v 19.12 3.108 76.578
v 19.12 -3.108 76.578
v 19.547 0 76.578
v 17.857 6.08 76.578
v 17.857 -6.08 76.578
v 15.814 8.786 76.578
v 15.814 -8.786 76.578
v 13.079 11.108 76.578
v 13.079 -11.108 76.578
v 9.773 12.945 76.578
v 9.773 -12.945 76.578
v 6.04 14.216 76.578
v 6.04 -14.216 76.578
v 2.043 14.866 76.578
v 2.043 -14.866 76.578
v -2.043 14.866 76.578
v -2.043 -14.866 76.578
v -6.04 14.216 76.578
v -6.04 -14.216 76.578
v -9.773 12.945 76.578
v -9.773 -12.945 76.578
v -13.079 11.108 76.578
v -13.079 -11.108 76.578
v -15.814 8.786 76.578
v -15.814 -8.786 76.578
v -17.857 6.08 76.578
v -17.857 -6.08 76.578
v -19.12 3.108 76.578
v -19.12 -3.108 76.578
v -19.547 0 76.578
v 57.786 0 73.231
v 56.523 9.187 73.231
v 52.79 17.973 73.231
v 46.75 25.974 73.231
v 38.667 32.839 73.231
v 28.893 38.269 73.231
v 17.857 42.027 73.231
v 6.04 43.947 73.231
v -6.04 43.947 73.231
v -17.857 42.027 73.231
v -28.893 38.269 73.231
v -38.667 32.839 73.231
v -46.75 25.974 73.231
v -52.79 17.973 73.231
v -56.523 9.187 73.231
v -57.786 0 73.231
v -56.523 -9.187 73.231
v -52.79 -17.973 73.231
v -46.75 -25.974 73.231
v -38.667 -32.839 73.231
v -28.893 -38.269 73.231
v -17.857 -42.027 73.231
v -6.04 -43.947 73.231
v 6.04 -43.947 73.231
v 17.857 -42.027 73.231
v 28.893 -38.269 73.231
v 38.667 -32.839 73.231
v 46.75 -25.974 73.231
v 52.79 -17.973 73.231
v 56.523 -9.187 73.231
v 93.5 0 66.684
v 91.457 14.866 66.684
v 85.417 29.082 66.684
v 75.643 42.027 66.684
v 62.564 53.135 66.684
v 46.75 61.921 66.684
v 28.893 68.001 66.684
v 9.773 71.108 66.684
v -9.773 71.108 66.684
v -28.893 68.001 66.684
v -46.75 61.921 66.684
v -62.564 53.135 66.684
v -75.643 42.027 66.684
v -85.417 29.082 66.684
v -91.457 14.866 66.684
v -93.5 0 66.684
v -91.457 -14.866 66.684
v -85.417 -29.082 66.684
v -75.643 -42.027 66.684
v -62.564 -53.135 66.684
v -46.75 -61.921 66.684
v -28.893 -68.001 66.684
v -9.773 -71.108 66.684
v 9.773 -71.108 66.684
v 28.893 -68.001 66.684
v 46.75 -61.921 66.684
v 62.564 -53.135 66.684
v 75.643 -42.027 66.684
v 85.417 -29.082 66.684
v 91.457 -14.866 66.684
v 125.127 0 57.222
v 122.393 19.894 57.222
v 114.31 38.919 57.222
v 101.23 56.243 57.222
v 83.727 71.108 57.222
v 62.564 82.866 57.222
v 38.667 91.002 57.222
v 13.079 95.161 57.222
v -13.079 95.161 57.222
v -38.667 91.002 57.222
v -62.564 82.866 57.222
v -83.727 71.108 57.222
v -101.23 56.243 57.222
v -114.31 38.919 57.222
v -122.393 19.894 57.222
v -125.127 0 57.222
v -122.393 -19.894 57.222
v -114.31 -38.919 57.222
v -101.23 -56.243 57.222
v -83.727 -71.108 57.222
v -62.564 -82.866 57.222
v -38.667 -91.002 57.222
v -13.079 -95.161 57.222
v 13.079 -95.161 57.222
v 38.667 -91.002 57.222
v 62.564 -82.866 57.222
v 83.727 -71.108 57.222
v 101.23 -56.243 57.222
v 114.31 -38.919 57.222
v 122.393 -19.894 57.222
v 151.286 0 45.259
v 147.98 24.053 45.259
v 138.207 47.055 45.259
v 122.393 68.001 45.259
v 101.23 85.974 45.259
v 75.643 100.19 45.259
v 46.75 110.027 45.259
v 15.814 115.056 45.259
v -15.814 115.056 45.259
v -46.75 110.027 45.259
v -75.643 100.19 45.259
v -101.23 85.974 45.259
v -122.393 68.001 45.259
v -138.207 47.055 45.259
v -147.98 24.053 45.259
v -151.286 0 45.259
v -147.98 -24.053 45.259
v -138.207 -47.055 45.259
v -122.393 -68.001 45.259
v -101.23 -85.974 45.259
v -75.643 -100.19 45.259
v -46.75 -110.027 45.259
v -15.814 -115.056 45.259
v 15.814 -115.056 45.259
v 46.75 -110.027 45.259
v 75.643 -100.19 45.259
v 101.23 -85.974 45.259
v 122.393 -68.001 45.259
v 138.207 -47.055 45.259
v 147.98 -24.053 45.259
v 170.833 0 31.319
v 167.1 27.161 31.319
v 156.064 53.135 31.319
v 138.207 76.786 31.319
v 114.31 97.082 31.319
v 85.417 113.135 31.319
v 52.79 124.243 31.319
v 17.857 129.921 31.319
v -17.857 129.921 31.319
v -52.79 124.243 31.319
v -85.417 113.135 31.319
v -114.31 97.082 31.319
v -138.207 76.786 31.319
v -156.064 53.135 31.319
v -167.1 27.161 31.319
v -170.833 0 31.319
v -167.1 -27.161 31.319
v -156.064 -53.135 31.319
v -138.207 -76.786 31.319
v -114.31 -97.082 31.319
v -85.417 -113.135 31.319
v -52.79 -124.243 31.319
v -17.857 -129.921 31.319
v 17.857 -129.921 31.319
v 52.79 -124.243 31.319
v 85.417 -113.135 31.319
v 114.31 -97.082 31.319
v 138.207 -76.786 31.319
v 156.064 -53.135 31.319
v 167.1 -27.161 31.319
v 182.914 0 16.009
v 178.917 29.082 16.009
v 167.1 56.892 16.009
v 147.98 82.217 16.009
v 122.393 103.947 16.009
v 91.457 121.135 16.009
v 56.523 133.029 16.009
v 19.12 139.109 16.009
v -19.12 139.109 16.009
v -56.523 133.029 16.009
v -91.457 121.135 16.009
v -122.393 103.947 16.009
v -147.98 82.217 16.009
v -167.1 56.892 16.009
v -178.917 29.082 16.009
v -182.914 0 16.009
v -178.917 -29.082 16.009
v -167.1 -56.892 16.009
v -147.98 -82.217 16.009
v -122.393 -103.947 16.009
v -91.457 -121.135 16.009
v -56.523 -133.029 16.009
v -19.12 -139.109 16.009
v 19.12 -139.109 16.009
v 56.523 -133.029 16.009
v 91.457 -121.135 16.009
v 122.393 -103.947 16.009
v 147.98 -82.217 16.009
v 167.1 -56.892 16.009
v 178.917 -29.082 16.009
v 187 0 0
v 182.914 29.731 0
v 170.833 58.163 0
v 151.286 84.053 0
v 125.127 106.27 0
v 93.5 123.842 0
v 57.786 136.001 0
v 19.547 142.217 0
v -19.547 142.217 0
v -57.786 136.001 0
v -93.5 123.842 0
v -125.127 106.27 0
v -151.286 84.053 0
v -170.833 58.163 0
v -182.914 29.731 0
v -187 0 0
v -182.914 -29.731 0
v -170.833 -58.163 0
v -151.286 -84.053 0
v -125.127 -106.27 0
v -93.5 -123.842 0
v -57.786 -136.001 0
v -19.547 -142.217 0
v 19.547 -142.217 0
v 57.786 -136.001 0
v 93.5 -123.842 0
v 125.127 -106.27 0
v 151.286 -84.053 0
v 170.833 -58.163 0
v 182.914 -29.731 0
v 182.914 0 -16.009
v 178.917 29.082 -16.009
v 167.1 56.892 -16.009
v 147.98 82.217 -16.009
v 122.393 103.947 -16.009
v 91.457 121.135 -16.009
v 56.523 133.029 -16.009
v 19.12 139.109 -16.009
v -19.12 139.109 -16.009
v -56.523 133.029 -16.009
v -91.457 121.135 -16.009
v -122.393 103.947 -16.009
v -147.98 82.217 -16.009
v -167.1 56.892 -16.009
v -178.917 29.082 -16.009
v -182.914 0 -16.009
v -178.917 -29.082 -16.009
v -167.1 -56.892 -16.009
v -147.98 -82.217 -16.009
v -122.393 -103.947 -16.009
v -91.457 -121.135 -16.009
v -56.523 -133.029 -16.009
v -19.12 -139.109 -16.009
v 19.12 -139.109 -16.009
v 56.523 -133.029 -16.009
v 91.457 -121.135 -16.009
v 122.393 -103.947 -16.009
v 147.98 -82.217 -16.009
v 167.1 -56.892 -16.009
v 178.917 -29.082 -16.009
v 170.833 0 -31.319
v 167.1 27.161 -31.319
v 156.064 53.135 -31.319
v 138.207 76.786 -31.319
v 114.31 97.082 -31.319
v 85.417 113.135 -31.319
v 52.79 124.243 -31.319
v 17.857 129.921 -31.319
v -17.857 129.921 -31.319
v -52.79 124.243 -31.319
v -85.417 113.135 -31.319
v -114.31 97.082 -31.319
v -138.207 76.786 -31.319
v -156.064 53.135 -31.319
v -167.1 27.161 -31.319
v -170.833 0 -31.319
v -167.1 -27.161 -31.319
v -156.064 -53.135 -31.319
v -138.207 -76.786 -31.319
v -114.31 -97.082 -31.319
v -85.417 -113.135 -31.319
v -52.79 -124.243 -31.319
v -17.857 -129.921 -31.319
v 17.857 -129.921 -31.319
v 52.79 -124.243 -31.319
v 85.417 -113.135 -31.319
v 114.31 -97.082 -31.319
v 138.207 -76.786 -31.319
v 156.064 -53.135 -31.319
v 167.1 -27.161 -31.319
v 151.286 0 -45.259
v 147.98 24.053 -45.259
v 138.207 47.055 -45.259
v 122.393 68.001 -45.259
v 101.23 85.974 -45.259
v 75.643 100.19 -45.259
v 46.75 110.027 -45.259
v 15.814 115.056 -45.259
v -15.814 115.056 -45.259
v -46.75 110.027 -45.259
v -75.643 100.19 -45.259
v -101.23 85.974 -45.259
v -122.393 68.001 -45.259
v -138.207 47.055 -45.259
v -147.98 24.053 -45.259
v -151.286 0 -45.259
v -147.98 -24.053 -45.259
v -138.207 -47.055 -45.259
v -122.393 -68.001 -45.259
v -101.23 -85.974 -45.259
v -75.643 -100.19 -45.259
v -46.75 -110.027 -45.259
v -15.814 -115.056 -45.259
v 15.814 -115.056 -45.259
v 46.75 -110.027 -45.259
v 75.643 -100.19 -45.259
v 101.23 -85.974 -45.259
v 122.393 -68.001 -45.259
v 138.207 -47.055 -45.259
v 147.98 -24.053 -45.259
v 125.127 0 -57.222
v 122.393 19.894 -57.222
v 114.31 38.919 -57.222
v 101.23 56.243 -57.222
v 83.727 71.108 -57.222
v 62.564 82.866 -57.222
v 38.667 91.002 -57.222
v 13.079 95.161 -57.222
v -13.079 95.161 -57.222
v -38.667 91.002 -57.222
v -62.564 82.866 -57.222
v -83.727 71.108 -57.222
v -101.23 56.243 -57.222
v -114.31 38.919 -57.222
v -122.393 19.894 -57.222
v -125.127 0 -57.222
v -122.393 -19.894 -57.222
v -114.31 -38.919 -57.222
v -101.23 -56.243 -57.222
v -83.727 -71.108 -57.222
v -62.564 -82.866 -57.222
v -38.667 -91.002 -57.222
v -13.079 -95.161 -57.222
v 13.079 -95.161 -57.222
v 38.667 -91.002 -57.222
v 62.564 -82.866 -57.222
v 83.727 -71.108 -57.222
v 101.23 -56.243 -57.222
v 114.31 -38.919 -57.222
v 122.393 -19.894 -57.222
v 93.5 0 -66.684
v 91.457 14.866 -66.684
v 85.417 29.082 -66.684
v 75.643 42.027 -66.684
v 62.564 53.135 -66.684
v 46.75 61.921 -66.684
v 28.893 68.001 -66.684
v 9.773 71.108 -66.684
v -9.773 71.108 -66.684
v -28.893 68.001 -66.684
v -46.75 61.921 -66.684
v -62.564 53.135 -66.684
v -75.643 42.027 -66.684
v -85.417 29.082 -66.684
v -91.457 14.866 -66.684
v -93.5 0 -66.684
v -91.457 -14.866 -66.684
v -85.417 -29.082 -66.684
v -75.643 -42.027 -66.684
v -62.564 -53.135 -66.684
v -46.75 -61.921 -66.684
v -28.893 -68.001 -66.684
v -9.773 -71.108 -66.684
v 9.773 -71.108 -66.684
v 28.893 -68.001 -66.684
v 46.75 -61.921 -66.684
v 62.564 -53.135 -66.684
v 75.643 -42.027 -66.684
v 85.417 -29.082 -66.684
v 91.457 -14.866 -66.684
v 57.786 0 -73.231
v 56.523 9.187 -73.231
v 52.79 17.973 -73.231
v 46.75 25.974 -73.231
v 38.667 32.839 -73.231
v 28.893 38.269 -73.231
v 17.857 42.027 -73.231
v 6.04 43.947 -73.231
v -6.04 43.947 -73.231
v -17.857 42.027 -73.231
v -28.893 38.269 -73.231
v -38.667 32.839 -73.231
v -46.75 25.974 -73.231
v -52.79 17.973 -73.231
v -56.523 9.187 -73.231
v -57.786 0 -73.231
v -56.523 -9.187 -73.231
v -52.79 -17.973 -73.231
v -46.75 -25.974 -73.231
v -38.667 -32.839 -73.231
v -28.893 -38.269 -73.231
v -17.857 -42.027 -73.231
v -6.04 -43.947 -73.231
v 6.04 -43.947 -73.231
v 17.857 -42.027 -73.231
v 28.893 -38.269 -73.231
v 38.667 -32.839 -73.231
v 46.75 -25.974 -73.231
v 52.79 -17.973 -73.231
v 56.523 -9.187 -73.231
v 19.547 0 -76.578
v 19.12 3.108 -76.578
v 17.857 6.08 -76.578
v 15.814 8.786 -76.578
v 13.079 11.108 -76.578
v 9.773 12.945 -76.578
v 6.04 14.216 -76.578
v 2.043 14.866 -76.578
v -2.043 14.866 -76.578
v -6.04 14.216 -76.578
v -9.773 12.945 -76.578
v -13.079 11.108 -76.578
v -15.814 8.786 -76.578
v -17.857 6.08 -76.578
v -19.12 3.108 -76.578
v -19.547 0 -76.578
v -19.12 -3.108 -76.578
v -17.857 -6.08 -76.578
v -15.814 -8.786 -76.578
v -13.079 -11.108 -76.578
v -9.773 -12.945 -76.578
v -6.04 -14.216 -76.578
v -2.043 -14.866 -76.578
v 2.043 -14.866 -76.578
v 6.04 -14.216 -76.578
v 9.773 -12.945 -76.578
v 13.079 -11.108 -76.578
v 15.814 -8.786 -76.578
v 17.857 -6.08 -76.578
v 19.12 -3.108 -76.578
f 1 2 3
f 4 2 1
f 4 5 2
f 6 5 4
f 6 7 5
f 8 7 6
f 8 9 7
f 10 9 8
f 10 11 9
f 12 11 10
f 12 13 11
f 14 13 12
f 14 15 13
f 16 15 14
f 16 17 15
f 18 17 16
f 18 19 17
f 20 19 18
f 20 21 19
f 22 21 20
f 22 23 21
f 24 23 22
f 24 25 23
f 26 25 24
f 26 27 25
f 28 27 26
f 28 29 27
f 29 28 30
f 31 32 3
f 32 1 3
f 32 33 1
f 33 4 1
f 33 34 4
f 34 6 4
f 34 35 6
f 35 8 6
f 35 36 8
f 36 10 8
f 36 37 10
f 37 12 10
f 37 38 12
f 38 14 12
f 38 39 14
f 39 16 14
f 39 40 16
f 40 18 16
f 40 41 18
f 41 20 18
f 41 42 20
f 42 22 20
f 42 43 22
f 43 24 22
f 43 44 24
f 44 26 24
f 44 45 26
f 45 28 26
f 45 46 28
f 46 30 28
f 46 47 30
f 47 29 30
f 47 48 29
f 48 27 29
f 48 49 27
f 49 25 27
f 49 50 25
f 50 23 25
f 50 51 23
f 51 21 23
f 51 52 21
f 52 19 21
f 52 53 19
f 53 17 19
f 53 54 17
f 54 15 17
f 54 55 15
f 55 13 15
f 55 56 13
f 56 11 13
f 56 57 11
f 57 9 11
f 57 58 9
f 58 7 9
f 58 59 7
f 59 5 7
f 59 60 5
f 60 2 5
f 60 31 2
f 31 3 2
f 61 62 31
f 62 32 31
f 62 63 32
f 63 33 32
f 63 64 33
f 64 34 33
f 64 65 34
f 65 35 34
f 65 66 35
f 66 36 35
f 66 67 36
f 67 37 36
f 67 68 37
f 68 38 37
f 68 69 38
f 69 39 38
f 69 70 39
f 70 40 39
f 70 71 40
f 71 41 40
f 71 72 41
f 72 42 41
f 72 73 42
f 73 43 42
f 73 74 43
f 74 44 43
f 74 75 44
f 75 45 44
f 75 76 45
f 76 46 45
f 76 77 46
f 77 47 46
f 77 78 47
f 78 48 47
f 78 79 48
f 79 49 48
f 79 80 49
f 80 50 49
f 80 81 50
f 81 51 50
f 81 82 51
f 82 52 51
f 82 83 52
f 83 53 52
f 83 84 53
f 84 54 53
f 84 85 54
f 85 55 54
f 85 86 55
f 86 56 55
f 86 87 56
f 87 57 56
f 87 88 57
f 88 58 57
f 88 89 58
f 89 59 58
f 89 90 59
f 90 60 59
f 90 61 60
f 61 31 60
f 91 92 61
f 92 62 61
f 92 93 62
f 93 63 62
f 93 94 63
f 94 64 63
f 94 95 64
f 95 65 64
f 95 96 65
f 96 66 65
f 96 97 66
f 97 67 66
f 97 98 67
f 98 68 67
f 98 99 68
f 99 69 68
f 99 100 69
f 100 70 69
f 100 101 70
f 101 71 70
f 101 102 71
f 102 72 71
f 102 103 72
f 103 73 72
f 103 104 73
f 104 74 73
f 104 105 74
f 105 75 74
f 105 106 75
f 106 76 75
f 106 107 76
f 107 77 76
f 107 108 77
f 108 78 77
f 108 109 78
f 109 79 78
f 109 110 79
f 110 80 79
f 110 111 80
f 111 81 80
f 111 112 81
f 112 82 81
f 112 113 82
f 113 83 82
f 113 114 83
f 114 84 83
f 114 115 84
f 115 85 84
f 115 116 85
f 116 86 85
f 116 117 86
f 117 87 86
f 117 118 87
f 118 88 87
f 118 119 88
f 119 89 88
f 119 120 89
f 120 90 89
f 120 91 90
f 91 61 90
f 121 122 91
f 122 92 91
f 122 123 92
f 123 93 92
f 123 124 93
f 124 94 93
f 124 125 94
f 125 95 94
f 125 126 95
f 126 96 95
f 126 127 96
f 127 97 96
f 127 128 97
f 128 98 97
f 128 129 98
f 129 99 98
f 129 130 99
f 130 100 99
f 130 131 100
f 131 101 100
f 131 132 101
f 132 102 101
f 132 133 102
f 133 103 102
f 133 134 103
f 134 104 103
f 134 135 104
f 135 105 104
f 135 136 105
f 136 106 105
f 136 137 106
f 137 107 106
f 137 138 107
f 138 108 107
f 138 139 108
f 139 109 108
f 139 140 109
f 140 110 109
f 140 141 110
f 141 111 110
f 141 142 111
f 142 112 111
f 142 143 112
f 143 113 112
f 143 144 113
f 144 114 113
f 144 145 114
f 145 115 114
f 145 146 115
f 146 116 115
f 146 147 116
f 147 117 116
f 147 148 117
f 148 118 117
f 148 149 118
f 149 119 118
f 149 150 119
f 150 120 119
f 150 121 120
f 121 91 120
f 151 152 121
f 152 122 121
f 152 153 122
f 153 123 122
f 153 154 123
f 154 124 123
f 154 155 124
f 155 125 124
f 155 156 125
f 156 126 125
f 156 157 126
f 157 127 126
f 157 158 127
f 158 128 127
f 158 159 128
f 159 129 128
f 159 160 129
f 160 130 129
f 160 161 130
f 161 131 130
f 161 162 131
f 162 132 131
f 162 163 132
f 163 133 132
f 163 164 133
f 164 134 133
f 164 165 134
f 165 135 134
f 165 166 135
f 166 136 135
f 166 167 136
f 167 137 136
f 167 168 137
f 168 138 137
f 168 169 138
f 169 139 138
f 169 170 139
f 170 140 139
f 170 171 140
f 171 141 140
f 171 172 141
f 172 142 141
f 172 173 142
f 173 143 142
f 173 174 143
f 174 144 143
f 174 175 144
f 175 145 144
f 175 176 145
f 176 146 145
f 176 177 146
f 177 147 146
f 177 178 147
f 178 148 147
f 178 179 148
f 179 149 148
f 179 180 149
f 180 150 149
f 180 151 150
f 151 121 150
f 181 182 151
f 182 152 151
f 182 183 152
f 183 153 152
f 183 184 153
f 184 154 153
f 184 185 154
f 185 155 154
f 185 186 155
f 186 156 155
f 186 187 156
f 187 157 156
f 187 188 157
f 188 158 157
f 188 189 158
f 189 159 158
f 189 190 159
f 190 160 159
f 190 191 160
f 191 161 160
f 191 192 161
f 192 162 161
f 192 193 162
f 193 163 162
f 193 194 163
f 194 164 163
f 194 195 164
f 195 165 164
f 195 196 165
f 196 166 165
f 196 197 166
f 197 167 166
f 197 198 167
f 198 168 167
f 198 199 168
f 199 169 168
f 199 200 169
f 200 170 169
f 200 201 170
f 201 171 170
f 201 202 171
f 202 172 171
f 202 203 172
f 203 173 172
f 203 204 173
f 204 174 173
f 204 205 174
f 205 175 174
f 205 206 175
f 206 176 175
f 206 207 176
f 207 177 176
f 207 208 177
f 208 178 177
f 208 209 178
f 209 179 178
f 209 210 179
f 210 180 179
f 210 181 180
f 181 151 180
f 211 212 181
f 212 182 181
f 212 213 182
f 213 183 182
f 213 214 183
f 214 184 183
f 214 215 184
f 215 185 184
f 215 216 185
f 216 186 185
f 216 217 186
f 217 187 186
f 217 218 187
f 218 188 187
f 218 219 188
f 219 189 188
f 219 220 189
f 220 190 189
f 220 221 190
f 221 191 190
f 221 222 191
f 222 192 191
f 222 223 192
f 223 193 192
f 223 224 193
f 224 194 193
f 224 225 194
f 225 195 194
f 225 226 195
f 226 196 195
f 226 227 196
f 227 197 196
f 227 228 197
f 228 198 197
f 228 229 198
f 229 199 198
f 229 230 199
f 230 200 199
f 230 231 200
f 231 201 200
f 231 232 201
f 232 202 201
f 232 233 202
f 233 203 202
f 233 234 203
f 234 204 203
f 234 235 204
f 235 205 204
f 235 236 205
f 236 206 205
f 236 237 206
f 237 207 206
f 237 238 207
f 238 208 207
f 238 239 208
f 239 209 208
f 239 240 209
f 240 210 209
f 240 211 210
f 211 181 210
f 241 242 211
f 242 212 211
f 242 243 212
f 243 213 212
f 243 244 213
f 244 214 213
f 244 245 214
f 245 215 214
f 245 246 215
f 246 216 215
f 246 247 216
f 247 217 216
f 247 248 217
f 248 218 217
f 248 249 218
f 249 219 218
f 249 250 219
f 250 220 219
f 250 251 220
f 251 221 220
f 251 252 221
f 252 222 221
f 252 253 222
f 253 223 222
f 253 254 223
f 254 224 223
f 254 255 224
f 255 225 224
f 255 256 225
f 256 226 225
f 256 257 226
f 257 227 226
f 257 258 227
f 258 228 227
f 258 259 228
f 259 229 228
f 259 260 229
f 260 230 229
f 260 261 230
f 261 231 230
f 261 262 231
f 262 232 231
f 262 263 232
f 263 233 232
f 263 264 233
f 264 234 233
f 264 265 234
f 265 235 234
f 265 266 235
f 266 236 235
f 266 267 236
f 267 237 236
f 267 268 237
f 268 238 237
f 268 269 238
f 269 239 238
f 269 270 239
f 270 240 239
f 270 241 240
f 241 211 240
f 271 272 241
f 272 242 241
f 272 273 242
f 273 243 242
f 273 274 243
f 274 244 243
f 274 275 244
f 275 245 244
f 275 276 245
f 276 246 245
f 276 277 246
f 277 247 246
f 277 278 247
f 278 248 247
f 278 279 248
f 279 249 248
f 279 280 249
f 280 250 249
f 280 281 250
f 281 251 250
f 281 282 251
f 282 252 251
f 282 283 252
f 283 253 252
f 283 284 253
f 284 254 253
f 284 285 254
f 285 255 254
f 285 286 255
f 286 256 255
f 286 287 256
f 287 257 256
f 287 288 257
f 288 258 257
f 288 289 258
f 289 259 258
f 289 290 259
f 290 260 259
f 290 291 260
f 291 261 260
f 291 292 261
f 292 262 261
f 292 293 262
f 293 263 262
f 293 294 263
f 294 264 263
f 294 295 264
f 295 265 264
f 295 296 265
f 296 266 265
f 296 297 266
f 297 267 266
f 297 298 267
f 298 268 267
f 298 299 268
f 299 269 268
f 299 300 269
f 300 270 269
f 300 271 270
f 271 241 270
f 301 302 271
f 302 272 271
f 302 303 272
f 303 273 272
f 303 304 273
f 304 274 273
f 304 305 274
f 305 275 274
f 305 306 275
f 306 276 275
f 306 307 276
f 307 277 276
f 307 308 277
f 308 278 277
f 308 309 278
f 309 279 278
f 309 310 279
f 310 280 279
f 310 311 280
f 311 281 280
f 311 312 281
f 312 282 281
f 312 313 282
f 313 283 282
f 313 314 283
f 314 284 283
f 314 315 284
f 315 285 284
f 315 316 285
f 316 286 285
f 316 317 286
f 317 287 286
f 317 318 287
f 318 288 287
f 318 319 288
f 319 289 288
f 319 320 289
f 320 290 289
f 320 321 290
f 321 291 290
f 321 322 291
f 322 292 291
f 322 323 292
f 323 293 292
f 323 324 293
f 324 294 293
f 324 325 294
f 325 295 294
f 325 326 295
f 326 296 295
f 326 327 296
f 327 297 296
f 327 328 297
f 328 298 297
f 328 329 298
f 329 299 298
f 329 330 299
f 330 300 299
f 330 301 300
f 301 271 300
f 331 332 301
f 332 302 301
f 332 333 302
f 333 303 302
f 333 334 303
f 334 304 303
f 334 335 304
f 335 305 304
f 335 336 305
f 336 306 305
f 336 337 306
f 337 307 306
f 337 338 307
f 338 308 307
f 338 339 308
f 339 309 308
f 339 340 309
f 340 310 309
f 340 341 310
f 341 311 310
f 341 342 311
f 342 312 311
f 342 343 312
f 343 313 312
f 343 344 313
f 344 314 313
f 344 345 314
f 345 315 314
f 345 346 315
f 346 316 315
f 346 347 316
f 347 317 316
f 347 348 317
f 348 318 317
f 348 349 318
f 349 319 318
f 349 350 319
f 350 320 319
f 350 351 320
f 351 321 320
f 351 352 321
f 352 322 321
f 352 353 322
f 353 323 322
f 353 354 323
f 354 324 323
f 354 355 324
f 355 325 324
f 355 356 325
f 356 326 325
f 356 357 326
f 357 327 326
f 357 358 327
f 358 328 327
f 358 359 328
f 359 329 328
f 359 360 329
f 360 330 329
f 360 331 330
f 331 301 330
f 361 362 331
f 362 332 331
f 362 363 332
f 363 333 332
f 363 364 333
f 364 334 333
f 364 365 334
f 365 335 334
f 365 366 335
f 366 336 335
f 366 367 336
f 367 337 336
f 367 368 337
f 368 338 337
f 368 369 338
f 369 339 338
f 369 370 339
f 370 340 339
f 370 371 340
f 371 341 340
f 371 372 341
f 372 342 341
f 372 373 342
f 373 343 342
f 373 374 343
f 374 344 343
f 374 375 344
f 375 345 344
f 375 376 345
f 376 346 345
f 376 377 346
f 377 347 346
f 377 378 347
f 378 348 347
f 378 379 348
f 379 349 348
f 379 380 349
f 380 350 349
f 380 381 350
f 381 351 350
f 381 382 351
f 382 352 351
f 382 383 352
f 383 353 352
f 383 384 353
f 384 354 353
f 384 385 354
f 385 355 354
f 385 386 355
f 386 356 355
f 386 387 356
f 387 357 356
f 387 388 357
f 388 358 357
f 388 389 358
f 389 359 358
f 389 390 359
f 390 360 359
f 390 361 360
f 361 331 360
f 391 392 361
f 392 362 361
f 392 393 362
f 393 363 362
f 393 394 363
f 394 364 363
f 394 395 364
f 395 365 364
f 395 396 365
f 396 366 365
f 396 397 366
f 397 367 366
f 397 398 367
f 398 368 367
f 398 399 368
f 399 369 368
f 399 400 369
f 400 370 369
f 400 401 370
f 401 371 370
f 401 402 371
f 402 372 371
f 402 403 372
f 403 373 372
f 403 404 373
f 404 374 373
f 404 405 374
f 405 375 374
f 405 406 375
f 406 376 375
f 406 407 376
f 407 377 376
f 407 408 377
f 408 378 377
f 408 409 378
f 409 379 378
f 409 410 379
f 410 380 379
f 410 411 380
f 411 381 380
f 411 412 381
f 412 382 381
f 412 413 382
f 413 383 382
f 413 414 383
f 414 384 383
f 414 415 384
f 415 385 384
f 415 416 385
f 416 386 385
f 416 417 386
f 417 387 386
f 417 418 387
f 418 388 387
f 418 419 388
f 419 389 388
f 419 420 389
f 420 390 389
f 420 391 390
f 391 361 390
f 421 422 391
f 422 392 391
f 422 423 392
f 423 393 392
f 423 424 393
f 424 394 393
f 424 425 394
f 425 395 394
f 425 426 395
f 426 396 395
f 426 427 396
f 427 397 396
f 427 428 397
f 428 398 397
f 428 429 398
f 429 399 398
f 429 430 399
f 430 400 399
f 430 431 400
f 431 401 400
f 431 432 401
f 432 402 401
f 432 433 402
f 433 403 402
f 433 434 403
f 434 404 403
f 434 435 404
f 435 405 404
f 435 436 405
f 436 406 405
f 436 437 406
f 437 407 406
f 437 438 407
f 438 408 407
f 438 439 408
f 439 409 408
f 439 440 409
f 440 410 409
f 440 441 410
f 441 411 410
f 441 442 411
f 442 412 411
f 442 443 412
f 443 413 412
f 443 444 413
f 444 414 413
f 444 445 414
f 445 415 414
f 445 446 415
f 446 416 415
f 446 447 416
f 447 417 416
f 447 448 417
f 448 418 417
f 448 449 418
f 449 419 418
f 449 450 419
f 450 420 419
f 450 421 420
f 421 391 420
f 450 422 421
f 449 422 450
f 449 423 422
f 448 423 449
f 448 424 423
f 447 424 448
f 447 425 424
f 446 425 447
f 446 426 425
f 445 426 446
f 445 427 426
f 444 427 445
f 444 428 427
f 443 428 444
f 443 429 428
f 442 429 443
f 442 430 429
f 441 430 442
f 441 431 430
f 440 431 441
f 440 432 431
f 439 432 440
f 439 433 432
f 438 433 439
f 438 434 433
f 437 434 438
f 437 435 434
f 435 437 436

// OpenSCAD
// Generated by SolidPython 1.0.1 on 2020-07-29 00:46:53


scale(v = [17, 13, 7]) {
	sphere(r = 11);
}
/***********************************************
*********      SolidPython code:      **********
************************************************
 
# import packages: SolidPython
from solid import *
from solid.utils import *
from itertools import chain, combinations, permutations


class Resize:

    def __init__(self, scad_file):
        self.scad_file = scad_file
        #self.scad_file = import_scad(scad_file)
        # cone/cylinder param:
        self.r1 = 0
        self.r2 = 0
        self.h = 0
        # rectangular prism param:
        self.w = 0
        self.l = 0
        # ellipse param:
        self.r = 0

    # import OpenScad code (file name corresponds to shape)


    # classify shape + parameters
    def assign(self, param1, param2, param3):
        if self.scad_file == 'cone.scad':
            self.r1 = param1
            self.r2 = param2
            self.h = param3
        elif self.scad_file == 'cylinder.scad':
            self.r1 = param1
            self.r2 = param2
            self.h = param3
        elif self.scad_file == 'rectangularPrism.scad':
            self.h = param1
            self.l = param2
            self.w = param3
        else:
            self.r = param1
            self.h = param2

    # resize parameters
    def iterate(self):
        x = range(3, 20, 2)
        i = 1
        if self.scad_file == 'cone.scad':
            tempList = list(permutations(x, 2))
            for temp in tempList:
                param1 = temp[0]
                param2 = temp[1]
                filepath = 'produced_scad_files/' + 'cone' + str(param1) + '_' + str(param2) + '_' + '.scad'
                scad_render_to_file(cylinder(h=param1, r1=param2, r2=0), filepath)

        elif self.scad_file == 'cylinder.scad':
            tempList = list(permutations(x, 3))
            for temp in tempList:
                param1 = temp[0]
                param2 = temp[1]
                filepath = 'produced_scad_files/' + 'cylinder' + str(param1) + '_' + str(param2) + '_' + '.scad'
                scad_render_to_file(cylinder(h=param1, r1=param2, r2=param2), filepath)

        elif self.scad_file == 'rectangularPrism.scad':
            tempList = list(permutations(x, 3))
            for temp in tempList:
                param1 = temp[0]
                param2 = temp[1]
                param3 = temp[2]
                filepath = 'produced_scad_files/' + 'rectangularPrism' + str(param1) + '_' + str(param2) + '_' + str(
                    param3) + '.scad'
                scad_render_to_file(cube(size=(param1, param2, param3)), filepath)

        elif self.scad_file == 'ellipse.scad':
            tempList = list(permutations(x, 4))
            for temp in tempList:
                param1 = temp[0]
                param2 = temp[1]
                param3 = temp[2]
                param4 = temp[3]
                filepath = 'produced_scad_files/' + 'ellipse' + str(param1) + '_' + str(param2) + '_' + str(param3) + '_' + str(param4) + '.scad'
                scad_render_to_file(scale([param1, param2, param3])(sphere(r=param4)), filepath)

    def render_to_scadfile(self):
        scad_render_to_file(scad, 'example.scad') 
 
************************************************/
